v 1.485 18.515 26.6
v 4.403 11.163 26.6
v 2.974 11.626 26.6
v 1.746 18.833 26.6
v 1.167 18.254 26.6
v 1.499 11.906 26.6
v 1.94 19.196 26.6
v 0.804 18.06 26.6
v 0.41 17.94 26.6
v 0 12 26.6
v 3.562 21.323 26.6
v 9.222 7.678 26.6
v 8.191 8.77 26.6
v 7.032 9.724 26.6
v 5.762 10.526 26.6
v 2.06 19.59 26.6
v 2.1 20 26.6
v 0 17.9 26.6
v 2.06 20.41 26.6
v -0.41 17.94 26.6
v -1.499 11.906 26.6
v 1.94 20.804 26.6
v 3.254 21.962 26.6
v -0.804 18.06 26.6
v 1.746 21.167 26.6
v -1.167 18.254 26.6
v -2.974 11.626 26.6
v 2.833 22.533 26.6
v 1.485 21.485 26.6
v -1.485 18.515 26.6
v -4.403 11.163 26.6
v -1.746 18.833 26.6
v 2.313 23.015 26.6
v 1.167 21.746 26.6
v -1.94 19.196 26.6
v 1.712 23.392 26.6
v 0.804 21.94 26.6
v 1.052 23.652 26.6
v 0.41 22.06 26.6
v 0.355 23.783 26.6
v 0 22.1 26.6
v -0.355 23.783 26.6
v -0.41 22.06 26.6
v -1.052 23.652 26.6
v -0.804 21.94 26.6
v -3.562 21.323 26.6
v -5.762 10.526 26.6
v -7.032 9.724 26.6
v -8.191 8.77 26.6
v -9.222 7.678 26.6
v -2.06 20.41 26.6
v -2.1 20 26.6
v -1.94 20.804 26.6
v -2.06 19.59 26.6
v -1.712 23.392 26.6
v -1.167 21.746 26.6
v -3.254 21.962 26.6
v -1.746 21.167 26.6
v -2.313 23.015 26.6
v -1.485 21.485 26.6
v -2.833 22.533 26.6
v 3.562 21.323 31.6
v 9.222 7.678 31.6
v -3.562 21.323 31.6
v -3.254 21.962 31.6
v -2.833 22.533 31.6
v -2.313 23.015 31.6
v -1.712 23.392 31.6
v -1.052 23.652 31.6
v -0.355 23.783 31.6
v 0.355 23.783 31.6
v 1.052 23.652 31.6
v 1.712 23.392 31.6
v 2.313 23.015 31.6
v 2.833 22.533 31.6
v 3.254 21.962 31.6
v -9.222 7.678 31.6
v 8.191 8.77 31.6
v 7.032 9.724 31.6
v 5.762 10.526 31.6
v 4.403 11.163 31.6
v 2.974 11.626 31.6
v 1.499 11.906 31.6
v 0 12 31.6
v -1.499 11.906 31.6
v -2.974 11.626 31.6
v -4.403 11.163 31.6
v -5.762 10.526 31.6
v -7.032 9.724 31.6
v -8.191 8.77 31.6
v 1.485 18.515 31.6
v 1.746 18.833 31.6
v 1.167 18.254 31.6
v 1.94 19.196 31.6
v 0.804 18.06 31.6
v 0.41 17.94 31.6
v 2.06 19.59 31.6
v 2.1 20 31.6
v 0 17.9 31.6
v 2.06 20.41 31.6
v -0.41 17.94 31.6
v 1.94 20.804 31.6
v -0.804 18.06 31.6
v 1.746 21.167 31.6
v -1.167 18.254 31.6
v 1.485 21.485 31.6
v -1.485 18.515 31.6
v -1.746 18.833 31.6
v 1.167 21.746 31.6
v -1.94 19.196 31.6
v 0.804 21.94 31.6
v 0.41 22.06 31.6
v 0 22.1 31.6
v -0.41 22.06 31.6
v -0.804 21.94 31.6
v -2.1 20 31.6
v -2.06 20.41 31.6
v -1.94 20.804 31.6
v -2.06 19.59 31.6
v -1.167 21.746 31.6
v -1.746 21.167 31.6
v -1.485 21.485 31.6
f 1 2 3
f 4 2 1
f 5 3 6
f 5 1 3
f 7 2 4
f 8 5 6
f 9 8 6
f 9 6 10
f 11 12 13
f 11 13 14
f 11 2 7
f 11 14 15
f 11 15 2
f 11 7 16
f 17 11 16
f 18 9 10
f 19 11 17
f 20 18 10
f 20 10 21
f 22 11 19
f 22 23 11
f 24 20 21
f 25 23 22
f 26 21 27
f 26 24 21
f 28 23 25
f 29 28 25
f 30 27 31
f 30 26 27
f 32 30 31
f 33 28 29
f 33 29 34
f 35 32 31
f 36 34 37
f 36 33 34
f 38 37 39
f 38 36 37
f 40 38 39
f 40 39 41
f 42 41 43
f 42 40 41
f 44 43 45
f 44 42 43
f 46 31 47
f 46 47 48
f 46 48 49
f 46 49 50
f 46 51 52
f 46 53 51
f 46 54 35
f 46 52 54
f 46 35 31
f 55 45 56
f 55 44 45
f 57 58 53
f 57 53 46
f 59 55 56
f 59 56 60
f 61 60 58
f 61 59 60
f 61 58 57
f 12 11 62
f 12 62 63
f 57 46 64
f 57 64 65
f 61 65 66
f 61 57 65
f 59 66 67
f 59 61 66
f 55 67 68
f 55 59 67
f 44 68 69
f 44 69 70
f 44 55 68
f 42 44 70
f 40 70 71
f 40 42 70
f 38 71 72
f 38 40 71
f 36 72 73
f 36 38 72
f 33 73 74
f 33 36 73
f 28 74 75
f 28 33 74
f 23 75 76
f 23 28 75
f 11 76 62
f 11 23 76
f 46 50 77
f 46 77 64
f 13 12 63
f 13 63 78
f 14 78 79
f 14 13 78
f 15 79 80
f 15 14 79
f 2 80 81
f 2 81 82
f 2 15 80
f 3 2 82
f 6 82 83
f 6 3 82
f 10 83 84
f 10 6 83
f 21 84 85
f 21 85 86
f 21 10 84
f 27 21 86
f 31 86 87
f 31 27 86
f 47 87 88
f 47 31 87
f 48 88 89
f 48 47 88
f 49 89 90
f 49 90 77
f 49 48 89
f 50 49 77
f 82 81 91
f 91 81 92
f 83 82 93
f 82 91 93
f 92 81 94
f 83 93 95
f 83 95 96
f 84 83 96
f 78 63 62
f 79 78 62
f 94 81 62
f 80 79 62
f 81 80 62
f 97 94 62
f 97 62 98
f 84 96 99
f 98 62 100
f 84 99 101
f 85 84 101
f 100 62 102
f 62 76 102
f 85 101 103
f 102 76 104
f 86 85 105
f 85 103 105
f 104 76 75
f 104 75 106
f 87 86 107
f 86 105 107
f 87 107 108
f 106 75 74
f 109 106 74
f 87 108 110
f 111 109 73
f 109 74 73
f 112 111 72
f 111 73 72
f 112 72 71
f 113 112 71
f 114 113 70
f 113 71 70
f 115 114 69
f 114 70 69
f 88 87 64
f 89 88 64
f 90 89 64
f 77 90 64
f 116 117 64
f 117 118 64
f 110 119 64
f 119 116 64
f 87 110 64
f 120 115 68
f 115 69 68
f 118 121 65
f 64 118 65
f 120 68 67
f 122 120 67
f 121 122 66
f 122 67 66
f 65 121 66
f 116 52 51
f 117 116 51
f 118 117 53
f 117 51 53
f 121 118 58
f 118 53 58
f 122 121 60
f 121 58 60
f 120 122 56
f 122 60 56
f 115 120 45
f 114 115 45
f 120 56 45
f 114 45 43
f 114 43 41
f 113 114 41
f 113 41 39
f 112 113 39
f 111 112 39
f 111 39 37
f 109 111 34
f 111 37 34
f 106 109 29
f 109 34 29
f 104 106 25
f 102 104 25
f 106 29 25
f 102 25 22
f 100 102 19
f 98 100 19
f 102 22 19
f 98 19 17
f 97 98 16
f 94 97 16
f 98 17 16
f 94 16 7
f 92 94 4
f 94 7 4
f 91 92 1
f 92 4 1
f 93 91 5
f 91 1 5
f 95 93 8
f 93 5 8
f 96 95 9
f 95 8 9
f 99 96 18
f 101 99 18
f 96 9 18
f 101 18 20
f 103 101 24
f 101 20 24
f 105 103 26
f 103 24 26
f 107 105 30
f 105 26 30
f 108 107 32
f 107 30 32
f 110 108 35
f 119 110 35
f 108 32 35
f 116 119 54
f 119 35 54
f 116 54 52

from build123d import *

# Parameters (mm, degrees)
DODANIE_WYCI_GNI_CIE1_START = -9.7
SZKIC2_R                    = 2.1
DODANIE_WYCI_GNI_CIE1_DEPTH = 5


with BuildPart() as part:
    # Szkic2 → Dodanie-wyciągnięcie1 (new body)
    with BuildSketch(Plane(origin=(0, 0, 16.9), x_dir=(-1, 0, 0), z_dir=(0, 0, -1)).offset(DODANIE_WYCI_GNI_CIE1_START)):
        with BuildLine():
            ThreePointArc((-9.222220763, 7.677932287), (0, 12), (9.222220763, 7.677932287))
            Line((9.222220763, 7.677932287), (3.562363692, 21.322711203))
            ThreePointArc((3.562363692, 21.322711203), (0, 23.8), (-3.562363692, 21.322711203))
            Line((-3.562363692, 21.322711203), (-9.222220763, 7.677932287))
        make_face()
        with Locations((0, 20)):
            Circle(SZKIC2_R, mode=Mode.SUBTRACT)
    extrude(amount=-DODANIE_WYCI_GNI_CIE1_DEPTH)


solid = part.part
